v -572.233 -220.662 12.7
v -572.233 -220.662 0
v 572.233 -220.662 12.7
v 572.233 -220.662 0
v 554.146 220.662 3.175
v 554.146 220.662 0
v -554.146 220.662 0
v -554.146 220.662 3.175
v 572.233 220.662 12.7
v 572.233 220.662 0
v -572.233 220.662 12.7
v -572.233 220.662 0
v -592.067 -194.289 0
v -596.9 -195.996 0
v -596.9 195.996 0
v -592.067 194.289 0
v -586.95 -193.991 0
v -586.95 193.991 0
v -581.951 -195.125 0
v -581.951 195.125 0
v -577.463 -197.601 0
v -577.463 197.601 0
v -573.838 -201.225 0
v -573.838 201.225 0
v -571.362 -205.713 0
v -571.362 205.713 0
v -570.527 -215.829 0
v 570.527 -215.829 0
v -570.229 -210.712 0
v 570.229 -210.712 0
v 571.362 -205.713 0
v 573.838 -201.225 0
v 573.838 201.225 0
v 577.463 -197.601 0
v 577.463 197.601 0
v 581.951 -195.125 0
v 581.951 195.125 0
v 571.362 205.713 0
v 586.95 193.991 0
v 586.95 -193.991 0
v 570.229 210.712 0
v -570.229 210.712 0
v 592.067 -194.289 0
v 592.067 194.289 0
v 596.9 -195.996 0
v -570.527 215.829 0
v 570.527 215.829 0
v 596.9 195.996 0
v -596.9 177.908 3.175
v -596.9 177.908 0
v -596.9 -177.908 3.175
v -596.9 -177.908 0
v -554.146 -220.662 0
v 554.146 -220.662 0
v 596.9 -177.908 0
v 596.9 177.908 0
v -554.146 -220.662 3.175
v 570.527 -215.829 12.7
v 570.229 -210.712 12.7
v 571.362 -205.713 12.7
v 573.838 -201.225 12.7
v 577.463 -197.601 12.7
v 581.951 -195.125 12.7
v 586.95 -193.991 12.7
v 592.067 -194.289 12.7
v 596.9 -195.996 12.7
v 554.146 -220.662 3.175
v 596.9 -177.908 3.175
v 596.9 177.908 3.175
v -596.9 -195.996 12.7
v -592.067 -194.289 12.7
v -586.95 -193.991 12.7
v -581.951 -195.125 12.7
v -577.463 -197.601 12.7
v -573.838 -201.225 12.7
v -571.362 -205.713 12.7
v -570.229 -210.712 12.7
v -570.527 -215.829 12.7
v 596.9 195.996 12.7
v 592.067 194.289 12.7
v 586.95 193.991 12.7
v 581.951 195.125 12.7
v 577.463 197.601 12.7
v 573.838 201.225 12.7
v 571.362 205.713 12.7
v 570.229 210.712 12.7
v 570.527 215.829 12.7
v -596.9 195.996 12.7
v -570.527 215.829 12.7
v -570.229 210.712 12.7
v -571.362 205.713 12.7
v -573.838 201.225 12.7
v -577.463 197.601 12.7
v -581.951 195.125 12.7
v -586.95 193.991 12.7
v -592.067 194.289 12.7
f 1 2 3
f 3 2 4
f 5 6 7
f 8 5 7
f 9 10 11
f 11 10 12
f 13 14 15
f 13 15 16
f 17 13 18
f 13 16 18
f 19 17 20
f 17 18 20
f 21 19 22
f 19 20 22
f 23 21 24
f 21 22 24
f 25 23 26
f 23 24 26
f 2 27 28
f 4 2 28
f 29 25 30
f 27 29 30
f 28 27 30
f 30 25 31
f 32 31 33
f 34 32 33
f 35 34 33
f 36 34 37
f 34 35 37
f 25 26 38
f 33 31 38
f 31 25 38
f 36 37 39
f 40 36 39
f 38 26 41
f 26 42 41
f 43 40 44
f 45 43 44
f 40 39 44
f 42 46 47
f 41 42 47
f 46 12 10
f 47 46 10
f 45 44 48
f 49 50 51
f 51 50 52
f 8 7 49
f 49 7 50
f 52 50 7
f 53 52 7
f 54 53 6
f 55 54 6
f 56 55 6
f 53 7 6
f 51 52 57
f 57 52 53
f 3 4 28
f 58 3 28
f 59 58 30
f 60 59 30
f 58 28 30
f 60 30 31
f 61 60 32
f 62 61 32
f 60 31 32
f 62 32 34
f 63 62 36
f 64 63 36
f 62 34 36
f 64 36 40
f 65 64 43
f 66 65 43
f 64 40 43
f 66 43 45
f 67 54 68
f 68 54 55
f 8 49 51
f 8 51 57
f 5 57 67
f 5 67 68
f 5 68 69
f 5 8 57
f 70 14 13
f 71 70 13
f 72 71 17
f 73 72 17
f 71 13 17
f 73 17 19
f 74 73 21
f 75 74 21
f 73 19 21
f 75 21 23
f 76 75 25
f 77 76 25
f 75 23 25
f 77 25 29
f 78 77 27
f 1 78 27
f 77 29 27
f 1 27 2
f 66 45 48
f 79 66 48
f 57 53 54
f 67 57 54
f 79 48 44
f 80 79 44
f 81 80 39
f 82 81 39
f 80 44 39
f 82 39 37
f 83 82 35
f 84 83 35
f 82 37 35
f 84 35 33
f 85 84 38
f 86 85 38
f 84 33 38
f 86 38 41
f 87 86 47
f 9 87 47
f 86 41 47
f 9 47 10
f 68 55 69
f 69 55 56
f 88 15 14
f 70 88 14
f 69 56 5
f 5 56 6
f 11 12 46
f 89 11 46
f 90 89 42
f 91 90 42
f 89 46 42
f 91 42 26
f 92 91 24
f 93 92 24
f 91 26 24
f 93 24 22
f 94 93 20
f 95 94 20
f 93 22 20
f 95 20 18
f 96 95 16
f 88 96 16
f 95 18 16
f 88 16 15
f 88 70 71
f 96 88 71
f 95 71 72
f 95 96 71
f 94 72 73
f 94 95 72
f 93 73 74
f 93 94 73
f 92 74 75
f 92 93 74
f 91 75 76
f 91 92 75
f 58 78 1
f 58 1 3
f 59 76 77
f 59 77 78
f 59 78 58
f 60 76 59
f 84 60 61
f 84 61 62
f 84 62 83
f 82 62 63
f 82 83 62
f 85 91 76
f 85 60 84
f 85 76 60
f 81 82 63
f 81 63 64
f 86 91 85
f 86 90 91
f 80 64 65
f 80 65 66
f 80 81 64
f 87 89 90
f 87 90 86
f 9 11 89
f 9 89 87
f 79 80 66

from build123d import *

# Parameters (mm, degrees)
F5_DEPTH = 12.7
F7_DEPTH = 3.175


# Not quite as in the source:
# - a length typed as a fraction of an inch, garbled in the dataset ("3 / 203.2 mm" for 3/8 in), is restored


with BuildPart() as f5:
    # F4 (on Top) → F5 (new body)
    with BuildSketch(Plane.XY):
        with BuildLine():
            Line((572.2333880236, 220.6625), (-572.2333880236, 220.6625))
            ThreePointArc((-572.2333880236, 220.6625), (-575.5229311857, 199.2854311857), (-596.9, 195.9958880236))
            Line((-596.9, 195.9958880236), (-596.9, -195.9958880236))
            ThreePointArc((-596.9, -195.9958880236), (-575.5229311857, -199.2854311857), (-572.2333880236, -220.6625))
            Line((-572.2333880236, -220.6625), (572.2333880236, -220.6625))
            ThreePointArc((572.2333880236, -220.6625), (575.5229311857, -199.2854311857), (596.9, -195.9958880236))
            Line((596.9, -195.9958880236), (596.9, 195.9958880236))
            ThreePointArc((596.9, 195.9958880236), (575.5229311857, 199.2854311857), (572.2333880236, 220.6625))
        make_face()
    extrude(amount=F5_DEPTH)


with BuildPart() as f7:
    # F6 (on Top) → F7 (new body)
    with BuildSketch(Plane.XY):
        Polygon((596.9, 177.9083623713), (554.1458623713, 220.6625), (-554.1458623713, 220.6625), (-596.9, 177.9083623713), (-596.9, -177.9083623713), (-554.1458623713, -220.6625), (554.1458623713, -220.6625), (596.9, -177.9083623713), align=None)
    extrude(amount=F7_DEPTH)


solid = Compound([f5.part, f7.part])
